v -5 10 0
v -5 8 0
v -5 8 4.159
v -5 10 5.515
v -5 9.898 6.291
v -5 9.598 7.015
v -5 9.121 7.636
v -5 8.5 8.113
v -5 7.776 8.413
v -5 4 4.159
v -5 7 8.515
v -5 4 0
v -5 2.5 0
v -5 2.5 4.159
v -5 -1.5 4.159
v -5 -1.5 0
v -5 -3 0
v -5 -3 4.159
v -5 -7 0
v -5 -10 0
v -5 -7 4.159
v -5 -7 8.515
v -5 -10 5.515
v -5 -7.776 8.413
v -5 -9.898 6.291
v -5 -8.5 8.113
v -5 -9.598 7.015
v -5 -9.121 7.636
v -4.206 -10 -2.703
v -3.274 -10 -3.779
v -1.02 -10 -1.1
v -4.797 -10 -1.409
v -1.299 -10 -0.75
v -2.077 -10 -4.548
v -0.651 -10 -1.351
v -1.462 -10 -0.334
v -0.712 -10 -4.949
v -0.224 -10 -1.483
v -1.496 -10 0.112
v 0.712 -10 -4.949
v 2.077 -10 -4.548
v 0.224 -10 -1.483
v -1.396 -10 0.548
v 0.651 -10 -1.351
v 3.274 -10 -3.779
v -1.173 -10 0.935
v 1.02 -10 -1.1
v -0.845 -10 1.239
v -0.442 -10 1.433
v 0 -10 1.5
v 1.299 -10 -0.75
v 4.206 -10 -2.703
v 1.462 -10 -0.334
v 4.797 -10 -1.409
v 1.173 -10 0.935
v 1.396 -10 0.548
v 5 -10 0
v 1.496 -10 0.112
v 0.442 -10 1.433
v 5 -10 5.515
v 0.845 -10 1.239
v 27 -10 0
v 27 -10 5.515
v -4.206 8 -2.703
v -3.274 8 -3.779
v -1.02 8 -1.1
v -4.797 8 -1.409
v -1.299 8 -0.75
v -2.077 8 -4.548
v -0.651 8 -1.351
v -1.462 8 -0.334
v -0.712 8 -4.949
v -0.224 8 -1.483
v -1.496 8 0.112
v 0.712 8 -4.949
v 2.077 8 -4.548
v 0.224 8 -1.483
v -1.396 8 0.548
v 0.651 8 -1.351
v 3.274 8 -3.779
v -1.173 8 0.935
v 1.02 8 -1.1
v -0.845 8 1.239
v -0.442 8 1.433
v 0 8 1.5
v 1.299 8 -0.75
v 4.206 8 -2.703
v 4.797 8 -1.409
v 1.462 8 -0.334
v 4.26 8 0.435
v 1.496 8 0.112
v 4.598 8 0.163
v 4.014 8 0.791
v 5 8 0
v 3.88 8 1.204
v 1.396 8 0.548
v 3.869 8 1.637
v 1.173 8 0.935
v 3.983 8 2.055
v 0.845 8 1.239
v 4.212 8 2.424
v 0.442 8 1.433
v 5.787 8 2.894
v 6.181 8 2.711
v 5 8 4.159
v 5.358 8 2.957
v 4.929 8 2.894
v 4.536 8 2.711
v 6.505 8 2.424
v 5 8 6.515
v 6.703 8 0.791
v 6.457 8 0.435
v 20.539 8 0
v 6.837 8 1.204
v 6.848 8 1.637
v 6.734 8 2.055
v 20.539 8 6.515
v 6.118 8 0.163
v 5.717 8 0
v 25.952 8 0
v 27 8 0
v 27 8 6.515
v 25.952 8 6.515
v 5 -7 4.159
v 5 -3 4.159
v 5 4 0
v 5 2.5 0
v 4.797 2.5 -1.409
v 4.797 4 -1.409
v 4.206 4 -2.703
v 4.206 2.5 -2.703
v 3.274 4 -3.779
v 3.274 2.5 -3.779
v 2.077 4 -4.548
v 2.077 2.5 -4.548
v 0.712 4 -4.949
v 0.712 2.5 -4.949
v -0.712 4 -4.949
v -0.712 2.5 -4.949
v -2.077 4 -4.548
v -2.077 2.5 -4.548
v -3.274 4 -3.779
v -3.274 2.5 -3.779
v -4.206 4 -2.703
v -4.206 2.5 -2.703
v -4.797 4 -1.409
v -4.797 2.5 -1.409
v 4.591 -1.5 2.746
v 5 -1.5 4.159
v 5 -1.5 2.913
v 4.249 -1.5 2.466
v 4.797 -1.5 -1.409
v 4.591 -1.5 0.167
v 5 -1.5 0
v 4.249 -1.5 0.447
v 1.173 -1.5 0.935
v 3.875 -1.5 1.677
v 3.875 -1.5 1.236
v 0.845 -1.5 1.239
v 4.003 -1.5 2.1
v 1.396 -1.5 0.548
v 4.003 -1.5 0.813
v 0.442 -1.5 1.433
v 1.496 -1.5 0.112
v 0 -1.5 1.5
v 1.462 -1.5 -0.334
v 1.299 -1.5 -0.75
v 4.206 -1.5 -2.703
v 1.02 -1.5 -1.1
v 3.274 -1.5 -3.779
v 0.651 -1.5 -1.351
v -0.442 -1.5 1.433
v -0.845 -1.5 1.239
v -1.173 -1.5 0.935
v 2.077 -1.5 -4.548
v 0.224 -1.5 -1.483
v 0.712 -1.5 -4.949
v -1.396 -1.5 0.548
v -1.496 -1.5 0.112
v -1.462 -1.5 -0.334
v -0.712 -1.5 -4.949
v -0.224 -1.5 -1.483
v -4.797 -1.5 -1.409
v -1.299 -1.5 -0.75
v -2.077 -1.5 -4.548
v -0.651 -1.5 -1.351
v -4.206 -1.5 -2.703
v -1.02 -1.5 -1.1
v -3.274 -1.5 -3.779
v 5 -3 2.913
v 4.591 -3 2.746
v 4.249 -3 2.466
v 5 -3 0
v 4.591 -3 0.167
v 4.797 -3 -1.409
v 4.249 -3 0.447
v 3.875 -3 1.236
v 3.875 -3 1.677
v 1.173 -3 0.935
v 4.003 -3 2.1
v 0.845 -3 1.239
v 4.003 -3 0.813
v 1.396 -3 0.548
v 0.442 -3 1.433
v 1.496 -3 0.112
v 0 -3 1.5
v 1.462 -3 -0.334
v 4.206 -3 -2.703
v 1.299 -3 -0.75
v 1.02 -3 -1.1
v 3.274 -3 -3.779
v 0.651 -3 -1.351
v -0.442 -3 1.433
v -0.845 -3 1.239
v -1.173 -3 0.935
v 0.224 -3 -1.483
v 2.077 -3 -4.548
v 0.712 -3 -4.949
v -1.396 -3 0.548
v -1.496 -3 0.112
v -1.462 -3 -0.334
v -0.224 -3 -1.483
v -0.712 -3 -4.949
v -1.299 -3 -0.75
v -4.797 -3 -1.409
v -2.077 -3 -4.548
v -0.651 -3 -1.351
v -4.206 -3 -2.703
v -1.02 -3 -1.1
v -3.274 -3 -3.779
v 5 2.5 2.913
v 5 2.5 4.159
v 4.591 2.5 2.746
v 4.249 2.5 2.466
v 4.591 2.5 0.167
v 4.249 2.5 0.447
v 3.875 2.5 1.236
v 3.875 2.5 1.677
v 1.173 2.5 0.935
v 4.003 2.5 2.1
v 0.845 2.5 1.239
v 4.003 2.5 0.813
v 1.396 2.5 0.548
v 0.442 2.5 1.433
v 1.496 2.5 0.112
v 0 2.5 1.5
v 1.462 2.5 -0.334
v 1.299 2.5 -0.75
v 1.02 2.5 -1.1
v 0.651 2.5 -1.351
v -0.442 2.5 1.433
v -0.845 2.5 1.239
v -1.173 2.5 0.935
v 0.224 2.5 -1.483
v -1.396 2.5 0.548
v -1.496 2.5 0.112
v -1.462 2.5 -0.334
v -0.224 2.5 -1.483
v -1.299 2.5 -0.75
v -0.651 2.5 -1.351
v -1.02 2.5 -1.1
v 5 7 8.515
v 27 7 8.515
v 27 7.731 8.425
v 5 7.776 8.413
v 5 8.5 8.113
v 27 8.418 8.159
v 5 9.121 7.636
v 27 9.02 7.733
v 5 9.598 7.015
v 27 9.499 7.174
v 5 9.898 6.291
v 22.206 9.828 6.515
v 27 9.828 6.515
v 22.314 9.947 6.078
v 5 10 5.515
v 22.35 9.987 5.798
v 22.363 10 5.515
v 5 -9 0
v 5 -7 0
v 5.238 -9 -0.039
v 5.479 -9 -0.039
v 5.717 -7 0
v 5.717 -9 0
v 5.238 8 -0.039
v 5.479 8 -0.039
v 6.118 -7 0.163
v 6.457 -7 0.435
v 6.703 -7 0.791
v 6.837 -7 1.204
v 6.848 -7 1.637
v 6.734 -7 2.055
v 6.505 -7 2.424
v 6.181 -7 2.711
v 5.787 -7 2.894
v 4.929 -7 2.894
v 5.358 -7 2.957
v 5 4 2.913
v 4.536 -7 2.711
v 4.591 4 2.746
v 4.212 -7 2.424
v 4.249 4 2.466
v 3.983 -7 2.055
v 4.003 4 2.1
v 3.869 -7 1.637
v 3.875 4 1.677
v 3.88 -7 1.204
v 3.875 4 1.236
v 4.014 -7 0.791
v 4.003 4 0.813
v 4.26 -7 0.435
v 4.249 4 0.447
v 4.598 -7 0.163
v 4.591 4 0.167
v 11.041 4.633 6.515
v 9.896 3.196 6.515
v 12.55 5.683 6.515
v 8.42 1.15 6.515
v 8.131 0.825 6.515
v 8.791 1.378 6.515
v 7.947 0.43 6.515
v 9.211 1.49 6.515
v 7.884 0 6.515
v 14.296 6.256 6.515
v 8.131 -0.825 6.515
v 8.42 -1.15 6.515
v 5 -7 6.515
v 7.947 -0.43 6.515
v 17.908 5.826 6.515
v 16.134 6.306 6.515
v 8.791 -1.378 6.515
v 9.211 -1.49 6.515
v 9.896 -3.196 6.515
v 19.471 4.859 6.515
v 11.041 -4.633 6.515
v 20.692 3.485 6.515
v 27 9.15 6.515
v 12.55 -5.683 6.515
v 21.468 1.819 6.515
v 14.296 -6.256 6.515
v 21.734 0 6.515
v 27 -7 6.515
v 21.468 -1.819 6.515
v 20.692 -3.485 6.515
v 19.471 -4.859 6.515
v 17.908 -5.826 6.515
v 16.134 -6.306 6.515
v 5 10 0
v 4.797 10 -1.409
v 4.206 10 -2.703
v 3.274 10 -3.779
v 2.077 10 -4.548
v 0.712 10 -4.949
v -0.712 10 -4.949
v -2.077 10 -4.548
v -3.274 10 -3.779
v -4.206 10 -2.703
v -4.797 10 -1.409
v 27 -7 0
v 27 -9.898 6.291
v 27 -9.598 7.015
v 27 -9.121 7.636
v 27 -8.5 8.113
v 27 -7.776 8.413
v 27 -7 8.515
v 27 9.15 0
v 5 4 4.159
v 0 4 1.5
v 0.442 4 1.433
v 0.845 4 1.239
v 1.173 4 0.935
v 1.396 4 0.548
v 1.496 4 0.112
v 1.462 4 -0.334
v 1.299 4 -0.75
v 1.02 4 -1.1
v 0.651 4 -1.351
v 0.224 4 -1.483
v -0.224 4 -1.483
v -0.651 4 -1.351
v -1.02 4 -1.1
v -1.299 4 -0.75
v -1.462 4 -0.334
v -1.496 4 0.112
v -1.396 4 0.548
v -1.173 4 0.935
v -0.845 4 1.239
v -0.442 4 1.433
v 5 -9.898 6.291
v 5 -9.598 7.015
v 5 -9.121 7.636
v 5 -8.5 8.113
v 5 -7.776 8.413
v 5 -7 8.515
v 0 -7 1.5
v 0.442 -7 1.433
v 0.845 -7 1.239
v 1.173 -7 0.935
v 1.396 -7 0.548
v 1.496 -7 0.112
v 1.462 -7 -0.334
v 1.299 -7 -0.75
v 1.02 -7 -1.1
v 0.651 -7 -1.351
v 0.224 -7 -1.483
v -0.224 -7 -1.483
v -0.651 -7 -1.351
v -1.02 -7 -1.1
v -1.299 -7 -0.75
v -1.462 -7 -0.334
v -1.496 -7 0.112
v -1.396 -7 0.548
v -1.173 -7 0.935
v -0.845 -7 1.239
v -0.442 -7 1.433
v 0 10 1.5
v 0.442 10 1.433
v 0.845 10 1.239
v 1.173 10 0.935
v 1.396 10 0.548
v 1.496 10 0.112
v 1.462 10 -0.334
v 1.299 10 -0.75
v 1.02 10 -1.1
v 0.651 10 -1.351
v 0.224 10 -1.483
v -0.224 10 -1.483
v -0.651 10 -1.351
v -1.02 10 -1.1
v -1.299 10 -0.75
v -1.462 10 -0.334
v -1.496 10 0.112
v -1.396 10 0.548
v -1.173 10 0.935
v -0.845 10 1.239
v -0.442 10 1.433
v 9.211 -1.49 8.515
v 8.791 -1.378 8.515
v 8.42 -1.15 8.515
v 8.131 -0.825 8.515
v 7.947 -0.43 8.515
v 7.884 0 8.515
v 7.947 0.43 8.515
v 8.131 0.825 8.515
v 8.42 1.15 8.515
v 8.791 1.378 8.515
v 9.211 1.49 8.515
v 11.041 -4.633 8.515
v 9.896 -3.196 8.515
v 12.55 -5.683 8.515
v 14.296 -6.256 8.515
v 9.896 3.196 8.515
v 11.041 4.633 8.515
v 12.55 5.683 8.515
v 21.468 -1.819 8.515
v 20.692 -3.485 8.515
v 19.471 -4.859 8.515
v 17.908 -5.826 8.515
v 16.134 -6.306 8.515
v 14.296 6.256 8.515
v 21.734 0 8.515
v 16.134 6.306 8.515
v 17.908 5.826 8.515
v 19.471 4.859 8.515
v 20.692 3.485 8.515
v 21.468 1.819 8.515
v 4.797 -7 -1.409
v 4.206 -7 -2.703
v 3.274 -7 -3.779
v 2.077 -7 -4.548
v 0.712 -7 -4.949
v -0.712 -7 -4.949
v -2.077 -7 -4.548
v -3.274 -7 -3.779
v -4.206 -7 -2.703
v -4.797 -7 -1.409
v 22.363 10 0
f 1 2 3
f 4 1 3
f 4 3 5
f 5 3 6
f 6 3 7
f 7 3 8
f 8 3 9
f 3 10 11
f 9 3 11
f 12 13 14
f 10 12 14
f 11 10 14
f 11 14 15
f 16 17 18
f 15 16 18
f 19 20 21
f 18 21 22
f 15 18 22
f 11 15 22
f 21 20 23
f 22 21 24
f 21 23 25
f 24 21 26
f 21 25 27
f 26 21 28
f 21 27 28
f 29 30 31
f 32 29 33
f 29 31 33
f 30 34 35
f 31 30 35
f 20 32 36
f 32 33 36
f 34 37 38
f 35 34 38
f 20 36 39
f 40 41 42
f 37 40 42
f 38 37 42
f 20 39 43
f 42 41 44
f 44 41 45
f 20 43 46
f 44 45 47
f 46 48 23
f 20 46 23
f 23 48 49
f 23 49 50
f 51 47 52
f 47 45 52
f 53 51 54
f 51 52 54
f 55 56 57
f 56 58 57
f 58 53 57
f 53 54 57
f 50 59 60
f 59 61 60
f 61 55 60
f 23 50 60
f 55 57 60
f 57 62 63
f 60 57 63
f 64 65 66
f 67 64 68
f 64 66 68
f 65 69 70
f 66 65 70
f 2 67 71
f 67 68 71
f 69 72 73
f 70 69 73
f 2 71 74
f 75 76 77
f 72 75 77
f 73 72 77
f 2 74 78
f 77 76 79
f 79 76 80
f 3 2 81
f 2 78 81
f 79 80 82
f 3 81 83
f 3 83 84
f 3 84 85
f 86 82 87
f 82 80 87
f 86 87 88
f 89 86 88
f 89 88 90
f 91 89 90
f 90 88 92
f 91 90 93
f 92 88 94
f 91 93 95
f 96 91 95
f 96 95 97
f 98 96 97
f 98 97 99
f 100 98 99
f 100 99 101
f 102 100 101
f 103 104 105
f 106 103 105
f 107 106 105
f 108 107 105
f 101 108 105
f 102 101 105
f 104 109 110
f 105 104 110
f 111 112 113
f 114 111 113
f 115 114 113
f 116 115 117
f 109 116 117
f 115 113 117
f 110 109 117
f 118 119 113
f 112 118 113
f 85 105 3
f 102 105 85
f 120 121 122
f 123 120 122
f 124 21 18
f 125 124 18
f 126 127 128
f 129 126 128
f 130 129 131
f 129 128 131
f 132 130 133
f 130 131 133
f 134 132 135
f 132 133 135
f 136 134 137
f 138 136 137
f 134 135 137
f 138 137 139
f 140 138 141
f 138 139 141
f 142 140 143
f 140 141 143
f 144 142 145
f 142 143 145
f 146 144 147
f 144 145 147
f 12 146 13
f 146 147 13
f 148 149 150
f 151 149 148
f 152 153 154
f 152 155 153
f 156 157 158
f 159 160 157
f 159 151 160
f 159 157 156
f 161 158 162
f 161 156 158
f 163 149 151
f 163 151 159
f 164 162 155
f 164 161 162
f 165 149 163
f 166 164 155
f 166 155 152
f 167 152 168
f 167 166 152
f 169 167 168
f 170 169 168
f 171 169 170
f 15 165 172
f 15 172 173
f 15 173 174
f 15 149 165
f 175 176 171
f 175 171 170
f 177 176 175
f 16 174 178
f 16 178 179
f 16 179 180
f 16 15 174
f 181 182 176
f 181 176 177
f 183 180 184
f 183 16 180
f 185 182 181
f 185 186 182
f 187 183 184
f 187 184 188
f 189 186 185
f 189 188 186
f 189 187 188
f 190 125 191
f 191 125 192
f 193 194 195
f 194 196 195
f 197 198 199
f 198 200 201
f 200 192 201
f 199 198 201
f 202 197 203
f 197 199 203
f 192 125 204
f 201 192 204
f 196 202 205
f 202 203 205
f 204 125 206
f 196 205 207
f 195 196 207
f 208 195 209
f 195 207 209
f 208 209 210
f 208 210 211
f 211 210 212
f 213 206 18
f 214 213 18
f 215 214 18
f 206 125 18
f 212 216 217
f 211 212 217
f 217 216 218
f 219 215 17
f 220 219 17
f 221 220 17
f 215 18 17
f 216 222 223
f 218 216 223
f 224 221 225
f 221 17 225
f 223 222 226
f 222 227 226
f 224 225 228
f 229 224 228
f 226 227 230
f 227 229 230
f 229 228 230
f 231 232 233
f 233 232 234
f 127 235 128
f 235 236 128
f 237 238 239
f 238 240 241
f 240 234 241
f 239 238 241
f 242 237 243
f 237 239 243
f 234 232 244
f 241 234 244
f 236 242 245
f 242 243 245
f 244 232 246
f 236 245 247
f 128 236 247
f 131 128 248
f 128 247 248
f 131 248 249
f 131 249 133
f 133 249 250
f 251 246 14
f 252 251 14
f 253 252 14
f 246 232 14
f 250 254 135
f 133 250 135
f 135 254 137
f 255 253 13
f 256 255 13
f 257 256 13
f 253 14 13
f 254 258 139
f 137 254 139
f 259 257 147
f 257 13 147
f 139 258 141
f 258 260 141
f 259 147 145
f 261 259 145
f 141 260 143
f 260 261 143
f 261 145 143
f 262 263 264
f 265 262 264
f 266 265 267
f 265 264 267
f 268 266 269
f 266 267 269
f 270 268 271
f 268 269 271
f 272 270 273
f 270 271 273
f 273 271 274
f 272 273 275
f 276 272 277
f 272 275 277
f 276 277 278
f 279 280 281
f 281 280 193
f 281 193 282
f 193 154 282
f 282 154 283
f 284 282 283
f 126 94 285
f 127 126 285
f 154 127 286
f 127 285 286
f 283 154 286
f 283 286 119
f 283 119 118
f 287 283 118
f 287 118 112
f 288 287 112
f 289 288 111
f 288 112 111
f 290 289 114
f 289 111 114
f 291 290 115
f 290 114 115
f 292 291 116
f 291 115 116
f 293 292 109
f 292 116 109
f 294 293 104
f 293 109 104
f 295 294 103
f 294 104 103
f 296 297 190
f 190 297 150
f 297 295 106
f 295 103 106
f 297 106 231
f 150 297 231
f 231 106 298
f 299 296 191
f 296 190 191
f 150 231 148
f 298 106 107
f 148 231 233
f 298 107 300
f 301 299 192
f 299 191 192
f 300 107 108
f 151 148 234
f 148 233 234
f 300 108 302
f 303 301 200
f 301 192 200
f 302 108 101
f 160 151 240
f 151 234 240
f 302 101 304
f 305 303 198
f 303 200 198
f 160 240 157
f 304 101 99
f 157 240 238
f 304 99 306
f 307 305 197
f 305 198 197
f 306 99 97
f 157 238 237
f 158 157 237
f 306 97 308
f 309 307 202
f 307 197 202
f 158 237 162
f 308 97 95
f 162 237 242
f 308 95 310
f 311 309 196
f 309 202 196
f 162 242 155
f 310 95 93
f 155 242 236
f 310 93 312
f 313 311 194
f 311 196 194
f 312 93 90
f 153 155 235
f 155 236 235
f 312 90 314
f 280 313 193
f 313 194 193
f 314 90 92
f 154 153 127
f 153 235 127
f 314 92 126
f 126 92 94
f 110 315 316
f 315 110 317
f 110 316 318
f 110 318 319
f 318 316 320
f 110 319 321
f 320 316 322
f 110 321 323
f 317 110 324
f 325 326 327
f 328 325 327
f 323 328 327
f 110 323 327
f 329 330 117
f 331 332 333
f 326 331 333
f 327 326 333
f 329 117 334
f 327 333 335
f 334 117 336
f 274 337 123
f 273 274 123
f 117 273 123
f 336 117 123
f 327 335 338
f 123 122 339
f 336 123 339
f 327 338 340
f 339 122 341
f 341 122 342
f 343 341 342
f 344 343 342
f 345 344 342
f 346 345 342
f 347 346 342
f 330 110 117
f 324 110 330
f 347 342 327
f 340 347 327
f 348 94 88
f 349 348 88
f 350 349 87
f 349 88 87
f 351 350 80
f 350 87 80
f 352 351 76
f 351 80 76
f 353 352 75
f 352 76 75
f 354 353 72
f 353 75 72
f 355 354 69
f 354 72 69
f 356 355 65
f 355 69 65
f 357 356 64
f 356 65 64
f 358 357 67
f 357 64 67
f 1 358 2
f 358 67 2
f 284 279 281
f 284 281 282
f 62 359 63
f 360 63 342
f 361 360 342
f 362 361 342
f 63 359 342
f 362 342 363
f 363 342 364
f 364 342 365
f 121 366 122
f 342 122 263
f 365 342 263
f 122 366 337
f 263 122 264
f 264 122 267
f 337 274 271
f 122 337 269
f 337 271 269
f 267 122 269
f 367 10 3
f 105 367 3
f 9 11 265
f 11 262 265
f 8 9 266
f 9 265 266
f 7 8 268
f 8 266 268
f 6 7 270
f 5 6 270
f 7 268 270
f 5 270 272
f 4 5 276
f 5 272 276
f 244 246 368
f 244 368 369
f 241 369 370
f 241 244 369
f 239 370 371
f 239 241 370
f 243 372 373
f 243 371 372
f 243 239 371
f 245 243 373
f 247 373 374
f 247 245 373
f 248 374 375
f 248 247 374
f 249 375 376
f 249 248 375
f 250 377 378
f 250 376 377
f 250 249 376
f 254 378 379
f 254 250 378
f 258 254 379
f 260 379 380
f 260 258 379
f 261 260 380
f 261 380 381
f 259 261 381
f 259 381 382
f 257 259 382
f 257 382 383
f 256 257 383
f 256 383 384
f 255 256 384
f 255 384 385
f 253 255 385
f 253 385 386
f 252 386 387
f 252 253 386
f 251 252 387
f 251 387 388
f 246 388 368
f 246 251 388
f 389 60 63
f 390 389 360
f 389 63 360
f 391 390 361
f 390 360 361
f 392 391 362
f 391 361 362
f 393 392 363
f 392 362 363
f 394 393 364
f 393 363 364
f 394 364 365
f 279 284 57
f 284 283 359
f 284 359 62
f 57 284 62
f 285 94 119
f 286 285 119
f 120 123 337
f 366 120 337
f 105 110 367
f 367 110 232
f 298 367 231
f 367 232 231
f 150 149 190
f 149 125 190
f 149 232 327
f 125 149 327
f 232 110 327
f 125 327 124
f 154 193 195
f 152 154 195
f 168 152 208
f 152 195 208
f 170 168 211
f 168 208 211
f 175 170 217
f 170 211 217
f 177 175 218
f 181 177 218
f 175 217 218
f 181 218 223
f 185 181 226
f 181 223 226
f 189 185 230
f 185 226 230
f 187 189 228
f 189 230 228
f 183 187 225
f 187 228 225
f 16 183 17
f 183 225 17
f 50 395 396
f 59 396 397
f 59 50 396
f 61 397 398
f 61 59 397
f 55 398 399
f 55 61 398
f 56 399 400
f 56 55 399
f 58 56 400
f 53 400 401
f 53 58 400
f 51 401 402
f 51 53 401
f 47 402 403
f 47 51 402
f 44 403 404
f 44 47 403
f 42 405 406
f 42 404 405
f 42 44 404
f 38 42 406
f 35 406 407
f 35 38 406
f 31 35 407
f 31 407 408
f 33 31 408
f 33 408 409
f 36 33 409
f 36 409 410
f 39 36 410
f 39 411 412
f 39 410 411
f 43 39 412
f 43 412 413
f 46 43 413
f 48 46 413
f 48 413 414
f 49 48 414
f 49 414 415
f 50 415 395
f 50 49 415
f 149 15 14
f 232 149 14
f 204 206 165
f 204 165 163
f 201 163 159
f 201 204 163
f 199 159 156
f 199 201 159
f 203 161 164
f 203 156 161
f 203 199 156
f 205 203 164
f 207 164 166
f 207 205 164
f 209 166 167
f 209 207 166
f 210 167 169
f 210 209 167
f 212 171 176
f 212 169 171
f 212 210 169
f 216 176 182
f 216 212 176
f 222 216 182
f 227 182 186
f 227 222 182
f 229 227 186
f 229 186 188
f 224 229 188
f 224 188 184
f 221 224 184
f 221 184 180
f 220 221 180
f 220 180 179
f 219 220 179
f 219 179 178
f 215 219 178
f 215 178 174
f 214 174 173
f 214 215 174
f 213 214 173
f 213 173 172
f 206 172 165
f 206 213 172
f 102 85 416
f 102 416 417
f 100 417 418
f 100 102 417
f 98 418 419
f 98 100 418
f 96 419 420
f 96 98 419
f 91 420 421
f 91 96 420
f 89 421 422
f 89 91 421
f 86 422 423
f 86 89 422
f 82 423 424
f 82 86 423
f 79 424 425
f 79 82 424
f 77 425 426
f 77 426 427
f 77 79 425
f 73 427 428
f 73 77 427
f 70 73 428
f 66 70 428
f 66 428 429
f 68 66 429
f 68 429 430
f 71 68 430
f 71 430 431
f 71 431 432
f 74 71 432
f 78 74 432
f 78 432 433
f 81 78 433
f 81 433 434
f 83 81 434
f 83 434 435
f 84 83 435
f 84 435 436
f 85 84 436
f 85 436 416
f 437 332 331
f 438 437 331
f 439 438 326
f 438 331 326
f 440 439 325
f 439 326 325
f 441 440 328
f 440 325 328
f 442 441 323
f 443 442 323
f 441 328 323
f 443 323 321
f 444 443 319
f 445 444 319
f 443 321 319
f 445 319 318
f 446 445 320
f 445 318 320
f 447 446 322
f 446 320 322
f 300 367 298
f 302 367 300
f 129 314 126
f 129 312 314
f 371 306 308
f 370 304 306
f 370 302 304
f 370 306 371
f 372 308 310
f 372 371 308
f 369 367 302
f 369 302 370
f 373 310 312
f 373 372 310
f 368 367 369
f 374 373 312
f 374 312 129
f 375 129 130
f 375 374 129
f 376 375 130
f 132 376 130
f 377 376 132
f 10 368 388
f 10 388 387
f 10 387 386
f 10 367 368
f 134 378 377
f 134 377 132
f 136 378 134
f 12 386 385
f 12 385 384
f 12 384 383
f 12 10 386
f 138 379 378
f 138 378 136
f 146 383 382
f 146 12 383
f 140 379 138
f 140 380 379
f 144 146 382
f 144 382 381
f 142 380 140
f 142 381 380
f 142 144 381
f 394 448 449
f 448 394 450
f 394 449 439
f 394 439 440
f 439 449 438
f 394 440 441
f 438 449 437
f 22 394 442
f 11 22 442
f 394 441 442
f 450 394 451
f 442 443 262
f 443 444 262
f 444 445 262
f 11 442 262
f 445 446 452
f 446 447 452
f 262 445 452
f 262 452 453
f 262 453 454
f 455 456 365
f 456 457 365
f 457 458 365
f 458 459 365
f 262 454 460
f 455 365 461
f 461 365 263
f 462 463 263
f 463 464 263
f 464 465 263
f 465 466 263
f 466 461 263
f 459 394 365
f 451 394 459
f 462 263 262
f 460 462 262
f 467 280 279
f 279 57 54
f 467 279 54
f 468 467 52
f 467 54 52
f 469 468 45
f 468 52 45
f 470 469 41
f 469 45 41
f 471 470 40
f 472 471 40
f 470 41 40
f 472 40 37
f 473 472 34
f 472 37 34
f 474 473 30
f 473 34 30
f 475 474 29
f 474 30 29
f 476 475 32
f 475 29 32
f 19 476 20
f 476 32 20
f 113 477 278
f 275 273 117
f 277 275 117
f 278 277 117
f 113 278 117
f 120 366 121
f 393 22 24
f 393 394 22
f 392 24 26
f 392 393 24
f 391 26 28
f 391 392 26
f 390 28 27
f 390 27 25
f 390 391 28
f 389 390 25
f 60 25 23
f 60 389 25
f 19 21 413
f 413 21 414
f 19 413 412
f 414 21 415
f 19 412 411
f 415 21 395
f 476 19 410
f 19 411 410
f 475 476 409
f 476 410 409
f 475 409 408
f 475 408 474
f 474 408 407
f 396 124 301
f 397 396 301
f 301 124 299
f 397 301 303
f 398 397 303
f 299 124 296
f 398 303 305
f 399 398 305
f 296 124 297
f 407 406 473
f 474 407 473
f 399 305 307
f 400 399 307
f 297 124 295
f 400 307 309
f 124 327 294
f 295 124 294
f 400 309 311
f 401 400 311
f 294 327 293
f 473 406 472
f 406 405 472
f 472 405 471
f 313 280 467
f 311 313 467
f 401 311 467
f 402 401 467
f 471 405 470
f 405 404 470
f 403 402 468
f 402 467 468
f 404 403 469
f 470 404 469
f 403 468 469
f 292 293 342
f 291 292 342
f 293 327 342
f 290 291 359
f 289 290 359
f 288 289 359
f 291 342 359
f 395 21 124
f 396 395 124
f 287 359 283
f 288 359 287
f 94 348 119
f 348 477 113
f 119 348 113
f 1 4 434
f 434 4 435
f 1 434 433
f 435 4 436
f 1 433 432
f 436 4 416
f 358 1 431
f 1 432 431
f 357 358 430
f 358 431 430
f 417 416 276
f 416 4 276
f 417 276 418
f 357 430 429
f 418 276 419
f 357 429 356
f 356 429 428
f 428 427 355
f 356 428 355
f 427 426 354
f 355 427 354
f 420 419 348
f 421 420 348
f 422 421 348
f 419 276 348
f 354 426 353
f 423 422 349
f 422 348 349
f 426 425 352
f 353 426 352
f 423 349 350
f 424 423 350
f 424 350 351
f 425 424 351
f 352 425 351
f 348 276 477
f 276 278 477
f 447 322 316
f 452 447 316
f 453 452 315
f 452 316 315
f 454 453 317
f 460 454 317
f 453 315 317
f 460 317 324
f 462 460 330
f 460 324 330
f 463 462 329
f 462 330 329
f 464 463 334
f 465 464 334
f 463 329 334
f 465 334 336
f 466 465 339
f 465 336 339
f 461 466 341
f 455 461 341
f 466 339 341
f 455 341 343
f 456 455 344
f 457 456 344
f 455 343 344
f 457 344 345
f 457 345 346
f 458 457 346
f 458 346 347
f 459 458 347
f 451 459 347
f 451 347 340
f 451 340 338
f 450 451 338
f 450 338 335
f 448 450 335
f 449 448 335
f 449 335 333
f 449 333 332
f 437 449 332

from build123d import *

# Parameters (mm, degrees)
BOSS_EXTRUDE1_DEPTH      = 10
BOSS_EXTRUDE1_DEPTH_BACK = 10
SKETCH1_R                = 1.5
CUT_EXTRUDE1_DEPTH       = 15.053645347
CUT_EXTRUDE1_DEPTH_BACK  = 15.053645347
SKETCH2_W                = 9.15922742
SKETCH2_H                = 4
FILLET1_R                = 3
BOSS_EXTRUDE2_START      = 22
BOSS_EXTRUDE2_DEPTH      = 22
CUT_EXTRUDE2_DEPTH       = 15
CUT_EXTRUDE3_DEPTH       = 15
SKETCH7_R                = 1.5
BOSS_EXTRUDE3_DEPTH      = 17


with BuildPart() as part:
    # Sketch1 → Boss-Extrude1 (new, two sides: drawn at the far end of the back side and taken through both)
    with BuildSketch(Plane(origin=(0, 0, 0), x_dir=(1, 0, 0), z_dir=(0, 1, 0)).offset(-BOSS_EXTRUDE1_DEPTH_BACK)):
        with BuildLine():
            Line((-5, -8.514983708), (5, -8.514983708))
            Line((5, -8.514983708), (5, 0))
            ThreePointArc((5, 0), (0, 5), (-5, 0))
            Line((-5, 0), (-5, -8.514983708))
        make_face()
        Circle(SKETCH1_R, mode=Mode.SUBTRACT)
    extrude(amount=BOSS_EXTRUDE1_DEPTH + BOSS_EXTRUDE1_DEPTH_BACK)

    # Sketch2 → Cut-Extrude1 (cut, two sides: drawn at the far end of the back side and taken through both)
    with BuildSketch(Plane(origin=(0, 0, 0), x_dir=(0, 0, -1), z_dir=(1, 0, 0)).offset(-CUT_EXTRUDE1_DEPTH_BACK)):
        with Locations((0.42038629, 6)):
            Rectangle(SKETCH2_W, SKETCH2_H)
        with Locations((0.42038629, 0.5)):
            Rectangle(SKETCH2_W, SKETCH2_H)
        with Locations((0.42038629, -5)):
            Rectangle(SKETCH2_W, SKETCH2_H)
    extrude(amount=CUT_EXTRUDE1_DEPTH + CUT_EXTRUDE1_DEPTH_BACK, mode=Mode.SUBTRACT)

    # Fillet1
    fillet1_edges = [part.edges().sort_by_distance(p)[0] for p in [
        (0, -10, 8.514983708),
        (0, 10, 8.514983708),
    ]]
    fillet(fillet1_edges, radius=FILLET1_R)

    # Sketch3 → Boss-Extrude2 (add)
    with BuildSketch(Plane(origin=(5, 0, 0), x_dir=(0, 0, -1), z_dir=(1, 0, 0)).offset(BOSS_EXTRUDE2_START)):
        with BuildLine():
            Line((-4.15922742, 8), (-6.514983708, 8))
            Line((-6.514983708, 8), (-6.514983708, -7))
            Line((-6.514983708, -7), (-4.15922742, -7))
            Line((-4.15922742, -7), (0, -7))
            Line((0, -7), (0, -10))
            Line((0, -10), (-5.514983708, -10))
            ThreePointArc((-5.514983708, -10), (-7.636304051, -9.121320344), (-8.514983708, -7))
            Line((-8.514983708, -7), (-8.514983708, 7))
            ThreePointArc((-8.514983708, 7), (-7.636304051, 9.121320344), (-5.514983708, 10))
            Line((-5.514983708, 10), (0, 10))
            Line((0, 10), (0, 8))
            Line((0, 8), (-4.15922742, 8))
        make_face()
    extrude(amount=-BOSS_EXTRUDE2_DEPTH)

    # Sketch4 → Cut-Extrude2 (cut)
    with BuildSketch(Plane(origin=(0, 0, 6.514983708), x_dir=(-1, 0, 0), z_dir=(0, 0, -1))):
        with BuildLine():
            ThreePointArc((-9.210889788, 1.490024104), (-21.733598121, 0), (-9.210889788, -1.490024104))
            ThreePointArc((-9.210889788, -1.490024104), (-7.883598121, 0), (-9.210889788, 1.490024104))
        make_face()
    extrude(amount=-CUT_EXTRUDE2_DEPTH, mode=Mode.SUBTRACT)

    # Sketch6 → Cut-Extrude3 (cut)
    with BuildSketch(Plane(origin=(0, 0, 6.514983708), x_dir=(-1, 0, 0), z_dir=(0, 0, -1))):
        Polygon((-22.036773602, 3.704956115), (-28.57394985, 10.876283833), (-25.617841784, 13.570986989), (-19.080665536, 6.399659271), align=None)
    extrude(amount=CUT_EXTRUDE3_DEPTH, mode=Mode.SUBTRACT)

    # Sketch7 → Boss-Extrude3 (add)
    with BuildSketch(Plane.XZ.offset(-8)):
        with Locations((5.358426028, 1.456547556)):
            Circle(SKETCH7_R)
    extrude(amount=BOSS_EXTRUDE3_DEPTH)


solid = part.part
